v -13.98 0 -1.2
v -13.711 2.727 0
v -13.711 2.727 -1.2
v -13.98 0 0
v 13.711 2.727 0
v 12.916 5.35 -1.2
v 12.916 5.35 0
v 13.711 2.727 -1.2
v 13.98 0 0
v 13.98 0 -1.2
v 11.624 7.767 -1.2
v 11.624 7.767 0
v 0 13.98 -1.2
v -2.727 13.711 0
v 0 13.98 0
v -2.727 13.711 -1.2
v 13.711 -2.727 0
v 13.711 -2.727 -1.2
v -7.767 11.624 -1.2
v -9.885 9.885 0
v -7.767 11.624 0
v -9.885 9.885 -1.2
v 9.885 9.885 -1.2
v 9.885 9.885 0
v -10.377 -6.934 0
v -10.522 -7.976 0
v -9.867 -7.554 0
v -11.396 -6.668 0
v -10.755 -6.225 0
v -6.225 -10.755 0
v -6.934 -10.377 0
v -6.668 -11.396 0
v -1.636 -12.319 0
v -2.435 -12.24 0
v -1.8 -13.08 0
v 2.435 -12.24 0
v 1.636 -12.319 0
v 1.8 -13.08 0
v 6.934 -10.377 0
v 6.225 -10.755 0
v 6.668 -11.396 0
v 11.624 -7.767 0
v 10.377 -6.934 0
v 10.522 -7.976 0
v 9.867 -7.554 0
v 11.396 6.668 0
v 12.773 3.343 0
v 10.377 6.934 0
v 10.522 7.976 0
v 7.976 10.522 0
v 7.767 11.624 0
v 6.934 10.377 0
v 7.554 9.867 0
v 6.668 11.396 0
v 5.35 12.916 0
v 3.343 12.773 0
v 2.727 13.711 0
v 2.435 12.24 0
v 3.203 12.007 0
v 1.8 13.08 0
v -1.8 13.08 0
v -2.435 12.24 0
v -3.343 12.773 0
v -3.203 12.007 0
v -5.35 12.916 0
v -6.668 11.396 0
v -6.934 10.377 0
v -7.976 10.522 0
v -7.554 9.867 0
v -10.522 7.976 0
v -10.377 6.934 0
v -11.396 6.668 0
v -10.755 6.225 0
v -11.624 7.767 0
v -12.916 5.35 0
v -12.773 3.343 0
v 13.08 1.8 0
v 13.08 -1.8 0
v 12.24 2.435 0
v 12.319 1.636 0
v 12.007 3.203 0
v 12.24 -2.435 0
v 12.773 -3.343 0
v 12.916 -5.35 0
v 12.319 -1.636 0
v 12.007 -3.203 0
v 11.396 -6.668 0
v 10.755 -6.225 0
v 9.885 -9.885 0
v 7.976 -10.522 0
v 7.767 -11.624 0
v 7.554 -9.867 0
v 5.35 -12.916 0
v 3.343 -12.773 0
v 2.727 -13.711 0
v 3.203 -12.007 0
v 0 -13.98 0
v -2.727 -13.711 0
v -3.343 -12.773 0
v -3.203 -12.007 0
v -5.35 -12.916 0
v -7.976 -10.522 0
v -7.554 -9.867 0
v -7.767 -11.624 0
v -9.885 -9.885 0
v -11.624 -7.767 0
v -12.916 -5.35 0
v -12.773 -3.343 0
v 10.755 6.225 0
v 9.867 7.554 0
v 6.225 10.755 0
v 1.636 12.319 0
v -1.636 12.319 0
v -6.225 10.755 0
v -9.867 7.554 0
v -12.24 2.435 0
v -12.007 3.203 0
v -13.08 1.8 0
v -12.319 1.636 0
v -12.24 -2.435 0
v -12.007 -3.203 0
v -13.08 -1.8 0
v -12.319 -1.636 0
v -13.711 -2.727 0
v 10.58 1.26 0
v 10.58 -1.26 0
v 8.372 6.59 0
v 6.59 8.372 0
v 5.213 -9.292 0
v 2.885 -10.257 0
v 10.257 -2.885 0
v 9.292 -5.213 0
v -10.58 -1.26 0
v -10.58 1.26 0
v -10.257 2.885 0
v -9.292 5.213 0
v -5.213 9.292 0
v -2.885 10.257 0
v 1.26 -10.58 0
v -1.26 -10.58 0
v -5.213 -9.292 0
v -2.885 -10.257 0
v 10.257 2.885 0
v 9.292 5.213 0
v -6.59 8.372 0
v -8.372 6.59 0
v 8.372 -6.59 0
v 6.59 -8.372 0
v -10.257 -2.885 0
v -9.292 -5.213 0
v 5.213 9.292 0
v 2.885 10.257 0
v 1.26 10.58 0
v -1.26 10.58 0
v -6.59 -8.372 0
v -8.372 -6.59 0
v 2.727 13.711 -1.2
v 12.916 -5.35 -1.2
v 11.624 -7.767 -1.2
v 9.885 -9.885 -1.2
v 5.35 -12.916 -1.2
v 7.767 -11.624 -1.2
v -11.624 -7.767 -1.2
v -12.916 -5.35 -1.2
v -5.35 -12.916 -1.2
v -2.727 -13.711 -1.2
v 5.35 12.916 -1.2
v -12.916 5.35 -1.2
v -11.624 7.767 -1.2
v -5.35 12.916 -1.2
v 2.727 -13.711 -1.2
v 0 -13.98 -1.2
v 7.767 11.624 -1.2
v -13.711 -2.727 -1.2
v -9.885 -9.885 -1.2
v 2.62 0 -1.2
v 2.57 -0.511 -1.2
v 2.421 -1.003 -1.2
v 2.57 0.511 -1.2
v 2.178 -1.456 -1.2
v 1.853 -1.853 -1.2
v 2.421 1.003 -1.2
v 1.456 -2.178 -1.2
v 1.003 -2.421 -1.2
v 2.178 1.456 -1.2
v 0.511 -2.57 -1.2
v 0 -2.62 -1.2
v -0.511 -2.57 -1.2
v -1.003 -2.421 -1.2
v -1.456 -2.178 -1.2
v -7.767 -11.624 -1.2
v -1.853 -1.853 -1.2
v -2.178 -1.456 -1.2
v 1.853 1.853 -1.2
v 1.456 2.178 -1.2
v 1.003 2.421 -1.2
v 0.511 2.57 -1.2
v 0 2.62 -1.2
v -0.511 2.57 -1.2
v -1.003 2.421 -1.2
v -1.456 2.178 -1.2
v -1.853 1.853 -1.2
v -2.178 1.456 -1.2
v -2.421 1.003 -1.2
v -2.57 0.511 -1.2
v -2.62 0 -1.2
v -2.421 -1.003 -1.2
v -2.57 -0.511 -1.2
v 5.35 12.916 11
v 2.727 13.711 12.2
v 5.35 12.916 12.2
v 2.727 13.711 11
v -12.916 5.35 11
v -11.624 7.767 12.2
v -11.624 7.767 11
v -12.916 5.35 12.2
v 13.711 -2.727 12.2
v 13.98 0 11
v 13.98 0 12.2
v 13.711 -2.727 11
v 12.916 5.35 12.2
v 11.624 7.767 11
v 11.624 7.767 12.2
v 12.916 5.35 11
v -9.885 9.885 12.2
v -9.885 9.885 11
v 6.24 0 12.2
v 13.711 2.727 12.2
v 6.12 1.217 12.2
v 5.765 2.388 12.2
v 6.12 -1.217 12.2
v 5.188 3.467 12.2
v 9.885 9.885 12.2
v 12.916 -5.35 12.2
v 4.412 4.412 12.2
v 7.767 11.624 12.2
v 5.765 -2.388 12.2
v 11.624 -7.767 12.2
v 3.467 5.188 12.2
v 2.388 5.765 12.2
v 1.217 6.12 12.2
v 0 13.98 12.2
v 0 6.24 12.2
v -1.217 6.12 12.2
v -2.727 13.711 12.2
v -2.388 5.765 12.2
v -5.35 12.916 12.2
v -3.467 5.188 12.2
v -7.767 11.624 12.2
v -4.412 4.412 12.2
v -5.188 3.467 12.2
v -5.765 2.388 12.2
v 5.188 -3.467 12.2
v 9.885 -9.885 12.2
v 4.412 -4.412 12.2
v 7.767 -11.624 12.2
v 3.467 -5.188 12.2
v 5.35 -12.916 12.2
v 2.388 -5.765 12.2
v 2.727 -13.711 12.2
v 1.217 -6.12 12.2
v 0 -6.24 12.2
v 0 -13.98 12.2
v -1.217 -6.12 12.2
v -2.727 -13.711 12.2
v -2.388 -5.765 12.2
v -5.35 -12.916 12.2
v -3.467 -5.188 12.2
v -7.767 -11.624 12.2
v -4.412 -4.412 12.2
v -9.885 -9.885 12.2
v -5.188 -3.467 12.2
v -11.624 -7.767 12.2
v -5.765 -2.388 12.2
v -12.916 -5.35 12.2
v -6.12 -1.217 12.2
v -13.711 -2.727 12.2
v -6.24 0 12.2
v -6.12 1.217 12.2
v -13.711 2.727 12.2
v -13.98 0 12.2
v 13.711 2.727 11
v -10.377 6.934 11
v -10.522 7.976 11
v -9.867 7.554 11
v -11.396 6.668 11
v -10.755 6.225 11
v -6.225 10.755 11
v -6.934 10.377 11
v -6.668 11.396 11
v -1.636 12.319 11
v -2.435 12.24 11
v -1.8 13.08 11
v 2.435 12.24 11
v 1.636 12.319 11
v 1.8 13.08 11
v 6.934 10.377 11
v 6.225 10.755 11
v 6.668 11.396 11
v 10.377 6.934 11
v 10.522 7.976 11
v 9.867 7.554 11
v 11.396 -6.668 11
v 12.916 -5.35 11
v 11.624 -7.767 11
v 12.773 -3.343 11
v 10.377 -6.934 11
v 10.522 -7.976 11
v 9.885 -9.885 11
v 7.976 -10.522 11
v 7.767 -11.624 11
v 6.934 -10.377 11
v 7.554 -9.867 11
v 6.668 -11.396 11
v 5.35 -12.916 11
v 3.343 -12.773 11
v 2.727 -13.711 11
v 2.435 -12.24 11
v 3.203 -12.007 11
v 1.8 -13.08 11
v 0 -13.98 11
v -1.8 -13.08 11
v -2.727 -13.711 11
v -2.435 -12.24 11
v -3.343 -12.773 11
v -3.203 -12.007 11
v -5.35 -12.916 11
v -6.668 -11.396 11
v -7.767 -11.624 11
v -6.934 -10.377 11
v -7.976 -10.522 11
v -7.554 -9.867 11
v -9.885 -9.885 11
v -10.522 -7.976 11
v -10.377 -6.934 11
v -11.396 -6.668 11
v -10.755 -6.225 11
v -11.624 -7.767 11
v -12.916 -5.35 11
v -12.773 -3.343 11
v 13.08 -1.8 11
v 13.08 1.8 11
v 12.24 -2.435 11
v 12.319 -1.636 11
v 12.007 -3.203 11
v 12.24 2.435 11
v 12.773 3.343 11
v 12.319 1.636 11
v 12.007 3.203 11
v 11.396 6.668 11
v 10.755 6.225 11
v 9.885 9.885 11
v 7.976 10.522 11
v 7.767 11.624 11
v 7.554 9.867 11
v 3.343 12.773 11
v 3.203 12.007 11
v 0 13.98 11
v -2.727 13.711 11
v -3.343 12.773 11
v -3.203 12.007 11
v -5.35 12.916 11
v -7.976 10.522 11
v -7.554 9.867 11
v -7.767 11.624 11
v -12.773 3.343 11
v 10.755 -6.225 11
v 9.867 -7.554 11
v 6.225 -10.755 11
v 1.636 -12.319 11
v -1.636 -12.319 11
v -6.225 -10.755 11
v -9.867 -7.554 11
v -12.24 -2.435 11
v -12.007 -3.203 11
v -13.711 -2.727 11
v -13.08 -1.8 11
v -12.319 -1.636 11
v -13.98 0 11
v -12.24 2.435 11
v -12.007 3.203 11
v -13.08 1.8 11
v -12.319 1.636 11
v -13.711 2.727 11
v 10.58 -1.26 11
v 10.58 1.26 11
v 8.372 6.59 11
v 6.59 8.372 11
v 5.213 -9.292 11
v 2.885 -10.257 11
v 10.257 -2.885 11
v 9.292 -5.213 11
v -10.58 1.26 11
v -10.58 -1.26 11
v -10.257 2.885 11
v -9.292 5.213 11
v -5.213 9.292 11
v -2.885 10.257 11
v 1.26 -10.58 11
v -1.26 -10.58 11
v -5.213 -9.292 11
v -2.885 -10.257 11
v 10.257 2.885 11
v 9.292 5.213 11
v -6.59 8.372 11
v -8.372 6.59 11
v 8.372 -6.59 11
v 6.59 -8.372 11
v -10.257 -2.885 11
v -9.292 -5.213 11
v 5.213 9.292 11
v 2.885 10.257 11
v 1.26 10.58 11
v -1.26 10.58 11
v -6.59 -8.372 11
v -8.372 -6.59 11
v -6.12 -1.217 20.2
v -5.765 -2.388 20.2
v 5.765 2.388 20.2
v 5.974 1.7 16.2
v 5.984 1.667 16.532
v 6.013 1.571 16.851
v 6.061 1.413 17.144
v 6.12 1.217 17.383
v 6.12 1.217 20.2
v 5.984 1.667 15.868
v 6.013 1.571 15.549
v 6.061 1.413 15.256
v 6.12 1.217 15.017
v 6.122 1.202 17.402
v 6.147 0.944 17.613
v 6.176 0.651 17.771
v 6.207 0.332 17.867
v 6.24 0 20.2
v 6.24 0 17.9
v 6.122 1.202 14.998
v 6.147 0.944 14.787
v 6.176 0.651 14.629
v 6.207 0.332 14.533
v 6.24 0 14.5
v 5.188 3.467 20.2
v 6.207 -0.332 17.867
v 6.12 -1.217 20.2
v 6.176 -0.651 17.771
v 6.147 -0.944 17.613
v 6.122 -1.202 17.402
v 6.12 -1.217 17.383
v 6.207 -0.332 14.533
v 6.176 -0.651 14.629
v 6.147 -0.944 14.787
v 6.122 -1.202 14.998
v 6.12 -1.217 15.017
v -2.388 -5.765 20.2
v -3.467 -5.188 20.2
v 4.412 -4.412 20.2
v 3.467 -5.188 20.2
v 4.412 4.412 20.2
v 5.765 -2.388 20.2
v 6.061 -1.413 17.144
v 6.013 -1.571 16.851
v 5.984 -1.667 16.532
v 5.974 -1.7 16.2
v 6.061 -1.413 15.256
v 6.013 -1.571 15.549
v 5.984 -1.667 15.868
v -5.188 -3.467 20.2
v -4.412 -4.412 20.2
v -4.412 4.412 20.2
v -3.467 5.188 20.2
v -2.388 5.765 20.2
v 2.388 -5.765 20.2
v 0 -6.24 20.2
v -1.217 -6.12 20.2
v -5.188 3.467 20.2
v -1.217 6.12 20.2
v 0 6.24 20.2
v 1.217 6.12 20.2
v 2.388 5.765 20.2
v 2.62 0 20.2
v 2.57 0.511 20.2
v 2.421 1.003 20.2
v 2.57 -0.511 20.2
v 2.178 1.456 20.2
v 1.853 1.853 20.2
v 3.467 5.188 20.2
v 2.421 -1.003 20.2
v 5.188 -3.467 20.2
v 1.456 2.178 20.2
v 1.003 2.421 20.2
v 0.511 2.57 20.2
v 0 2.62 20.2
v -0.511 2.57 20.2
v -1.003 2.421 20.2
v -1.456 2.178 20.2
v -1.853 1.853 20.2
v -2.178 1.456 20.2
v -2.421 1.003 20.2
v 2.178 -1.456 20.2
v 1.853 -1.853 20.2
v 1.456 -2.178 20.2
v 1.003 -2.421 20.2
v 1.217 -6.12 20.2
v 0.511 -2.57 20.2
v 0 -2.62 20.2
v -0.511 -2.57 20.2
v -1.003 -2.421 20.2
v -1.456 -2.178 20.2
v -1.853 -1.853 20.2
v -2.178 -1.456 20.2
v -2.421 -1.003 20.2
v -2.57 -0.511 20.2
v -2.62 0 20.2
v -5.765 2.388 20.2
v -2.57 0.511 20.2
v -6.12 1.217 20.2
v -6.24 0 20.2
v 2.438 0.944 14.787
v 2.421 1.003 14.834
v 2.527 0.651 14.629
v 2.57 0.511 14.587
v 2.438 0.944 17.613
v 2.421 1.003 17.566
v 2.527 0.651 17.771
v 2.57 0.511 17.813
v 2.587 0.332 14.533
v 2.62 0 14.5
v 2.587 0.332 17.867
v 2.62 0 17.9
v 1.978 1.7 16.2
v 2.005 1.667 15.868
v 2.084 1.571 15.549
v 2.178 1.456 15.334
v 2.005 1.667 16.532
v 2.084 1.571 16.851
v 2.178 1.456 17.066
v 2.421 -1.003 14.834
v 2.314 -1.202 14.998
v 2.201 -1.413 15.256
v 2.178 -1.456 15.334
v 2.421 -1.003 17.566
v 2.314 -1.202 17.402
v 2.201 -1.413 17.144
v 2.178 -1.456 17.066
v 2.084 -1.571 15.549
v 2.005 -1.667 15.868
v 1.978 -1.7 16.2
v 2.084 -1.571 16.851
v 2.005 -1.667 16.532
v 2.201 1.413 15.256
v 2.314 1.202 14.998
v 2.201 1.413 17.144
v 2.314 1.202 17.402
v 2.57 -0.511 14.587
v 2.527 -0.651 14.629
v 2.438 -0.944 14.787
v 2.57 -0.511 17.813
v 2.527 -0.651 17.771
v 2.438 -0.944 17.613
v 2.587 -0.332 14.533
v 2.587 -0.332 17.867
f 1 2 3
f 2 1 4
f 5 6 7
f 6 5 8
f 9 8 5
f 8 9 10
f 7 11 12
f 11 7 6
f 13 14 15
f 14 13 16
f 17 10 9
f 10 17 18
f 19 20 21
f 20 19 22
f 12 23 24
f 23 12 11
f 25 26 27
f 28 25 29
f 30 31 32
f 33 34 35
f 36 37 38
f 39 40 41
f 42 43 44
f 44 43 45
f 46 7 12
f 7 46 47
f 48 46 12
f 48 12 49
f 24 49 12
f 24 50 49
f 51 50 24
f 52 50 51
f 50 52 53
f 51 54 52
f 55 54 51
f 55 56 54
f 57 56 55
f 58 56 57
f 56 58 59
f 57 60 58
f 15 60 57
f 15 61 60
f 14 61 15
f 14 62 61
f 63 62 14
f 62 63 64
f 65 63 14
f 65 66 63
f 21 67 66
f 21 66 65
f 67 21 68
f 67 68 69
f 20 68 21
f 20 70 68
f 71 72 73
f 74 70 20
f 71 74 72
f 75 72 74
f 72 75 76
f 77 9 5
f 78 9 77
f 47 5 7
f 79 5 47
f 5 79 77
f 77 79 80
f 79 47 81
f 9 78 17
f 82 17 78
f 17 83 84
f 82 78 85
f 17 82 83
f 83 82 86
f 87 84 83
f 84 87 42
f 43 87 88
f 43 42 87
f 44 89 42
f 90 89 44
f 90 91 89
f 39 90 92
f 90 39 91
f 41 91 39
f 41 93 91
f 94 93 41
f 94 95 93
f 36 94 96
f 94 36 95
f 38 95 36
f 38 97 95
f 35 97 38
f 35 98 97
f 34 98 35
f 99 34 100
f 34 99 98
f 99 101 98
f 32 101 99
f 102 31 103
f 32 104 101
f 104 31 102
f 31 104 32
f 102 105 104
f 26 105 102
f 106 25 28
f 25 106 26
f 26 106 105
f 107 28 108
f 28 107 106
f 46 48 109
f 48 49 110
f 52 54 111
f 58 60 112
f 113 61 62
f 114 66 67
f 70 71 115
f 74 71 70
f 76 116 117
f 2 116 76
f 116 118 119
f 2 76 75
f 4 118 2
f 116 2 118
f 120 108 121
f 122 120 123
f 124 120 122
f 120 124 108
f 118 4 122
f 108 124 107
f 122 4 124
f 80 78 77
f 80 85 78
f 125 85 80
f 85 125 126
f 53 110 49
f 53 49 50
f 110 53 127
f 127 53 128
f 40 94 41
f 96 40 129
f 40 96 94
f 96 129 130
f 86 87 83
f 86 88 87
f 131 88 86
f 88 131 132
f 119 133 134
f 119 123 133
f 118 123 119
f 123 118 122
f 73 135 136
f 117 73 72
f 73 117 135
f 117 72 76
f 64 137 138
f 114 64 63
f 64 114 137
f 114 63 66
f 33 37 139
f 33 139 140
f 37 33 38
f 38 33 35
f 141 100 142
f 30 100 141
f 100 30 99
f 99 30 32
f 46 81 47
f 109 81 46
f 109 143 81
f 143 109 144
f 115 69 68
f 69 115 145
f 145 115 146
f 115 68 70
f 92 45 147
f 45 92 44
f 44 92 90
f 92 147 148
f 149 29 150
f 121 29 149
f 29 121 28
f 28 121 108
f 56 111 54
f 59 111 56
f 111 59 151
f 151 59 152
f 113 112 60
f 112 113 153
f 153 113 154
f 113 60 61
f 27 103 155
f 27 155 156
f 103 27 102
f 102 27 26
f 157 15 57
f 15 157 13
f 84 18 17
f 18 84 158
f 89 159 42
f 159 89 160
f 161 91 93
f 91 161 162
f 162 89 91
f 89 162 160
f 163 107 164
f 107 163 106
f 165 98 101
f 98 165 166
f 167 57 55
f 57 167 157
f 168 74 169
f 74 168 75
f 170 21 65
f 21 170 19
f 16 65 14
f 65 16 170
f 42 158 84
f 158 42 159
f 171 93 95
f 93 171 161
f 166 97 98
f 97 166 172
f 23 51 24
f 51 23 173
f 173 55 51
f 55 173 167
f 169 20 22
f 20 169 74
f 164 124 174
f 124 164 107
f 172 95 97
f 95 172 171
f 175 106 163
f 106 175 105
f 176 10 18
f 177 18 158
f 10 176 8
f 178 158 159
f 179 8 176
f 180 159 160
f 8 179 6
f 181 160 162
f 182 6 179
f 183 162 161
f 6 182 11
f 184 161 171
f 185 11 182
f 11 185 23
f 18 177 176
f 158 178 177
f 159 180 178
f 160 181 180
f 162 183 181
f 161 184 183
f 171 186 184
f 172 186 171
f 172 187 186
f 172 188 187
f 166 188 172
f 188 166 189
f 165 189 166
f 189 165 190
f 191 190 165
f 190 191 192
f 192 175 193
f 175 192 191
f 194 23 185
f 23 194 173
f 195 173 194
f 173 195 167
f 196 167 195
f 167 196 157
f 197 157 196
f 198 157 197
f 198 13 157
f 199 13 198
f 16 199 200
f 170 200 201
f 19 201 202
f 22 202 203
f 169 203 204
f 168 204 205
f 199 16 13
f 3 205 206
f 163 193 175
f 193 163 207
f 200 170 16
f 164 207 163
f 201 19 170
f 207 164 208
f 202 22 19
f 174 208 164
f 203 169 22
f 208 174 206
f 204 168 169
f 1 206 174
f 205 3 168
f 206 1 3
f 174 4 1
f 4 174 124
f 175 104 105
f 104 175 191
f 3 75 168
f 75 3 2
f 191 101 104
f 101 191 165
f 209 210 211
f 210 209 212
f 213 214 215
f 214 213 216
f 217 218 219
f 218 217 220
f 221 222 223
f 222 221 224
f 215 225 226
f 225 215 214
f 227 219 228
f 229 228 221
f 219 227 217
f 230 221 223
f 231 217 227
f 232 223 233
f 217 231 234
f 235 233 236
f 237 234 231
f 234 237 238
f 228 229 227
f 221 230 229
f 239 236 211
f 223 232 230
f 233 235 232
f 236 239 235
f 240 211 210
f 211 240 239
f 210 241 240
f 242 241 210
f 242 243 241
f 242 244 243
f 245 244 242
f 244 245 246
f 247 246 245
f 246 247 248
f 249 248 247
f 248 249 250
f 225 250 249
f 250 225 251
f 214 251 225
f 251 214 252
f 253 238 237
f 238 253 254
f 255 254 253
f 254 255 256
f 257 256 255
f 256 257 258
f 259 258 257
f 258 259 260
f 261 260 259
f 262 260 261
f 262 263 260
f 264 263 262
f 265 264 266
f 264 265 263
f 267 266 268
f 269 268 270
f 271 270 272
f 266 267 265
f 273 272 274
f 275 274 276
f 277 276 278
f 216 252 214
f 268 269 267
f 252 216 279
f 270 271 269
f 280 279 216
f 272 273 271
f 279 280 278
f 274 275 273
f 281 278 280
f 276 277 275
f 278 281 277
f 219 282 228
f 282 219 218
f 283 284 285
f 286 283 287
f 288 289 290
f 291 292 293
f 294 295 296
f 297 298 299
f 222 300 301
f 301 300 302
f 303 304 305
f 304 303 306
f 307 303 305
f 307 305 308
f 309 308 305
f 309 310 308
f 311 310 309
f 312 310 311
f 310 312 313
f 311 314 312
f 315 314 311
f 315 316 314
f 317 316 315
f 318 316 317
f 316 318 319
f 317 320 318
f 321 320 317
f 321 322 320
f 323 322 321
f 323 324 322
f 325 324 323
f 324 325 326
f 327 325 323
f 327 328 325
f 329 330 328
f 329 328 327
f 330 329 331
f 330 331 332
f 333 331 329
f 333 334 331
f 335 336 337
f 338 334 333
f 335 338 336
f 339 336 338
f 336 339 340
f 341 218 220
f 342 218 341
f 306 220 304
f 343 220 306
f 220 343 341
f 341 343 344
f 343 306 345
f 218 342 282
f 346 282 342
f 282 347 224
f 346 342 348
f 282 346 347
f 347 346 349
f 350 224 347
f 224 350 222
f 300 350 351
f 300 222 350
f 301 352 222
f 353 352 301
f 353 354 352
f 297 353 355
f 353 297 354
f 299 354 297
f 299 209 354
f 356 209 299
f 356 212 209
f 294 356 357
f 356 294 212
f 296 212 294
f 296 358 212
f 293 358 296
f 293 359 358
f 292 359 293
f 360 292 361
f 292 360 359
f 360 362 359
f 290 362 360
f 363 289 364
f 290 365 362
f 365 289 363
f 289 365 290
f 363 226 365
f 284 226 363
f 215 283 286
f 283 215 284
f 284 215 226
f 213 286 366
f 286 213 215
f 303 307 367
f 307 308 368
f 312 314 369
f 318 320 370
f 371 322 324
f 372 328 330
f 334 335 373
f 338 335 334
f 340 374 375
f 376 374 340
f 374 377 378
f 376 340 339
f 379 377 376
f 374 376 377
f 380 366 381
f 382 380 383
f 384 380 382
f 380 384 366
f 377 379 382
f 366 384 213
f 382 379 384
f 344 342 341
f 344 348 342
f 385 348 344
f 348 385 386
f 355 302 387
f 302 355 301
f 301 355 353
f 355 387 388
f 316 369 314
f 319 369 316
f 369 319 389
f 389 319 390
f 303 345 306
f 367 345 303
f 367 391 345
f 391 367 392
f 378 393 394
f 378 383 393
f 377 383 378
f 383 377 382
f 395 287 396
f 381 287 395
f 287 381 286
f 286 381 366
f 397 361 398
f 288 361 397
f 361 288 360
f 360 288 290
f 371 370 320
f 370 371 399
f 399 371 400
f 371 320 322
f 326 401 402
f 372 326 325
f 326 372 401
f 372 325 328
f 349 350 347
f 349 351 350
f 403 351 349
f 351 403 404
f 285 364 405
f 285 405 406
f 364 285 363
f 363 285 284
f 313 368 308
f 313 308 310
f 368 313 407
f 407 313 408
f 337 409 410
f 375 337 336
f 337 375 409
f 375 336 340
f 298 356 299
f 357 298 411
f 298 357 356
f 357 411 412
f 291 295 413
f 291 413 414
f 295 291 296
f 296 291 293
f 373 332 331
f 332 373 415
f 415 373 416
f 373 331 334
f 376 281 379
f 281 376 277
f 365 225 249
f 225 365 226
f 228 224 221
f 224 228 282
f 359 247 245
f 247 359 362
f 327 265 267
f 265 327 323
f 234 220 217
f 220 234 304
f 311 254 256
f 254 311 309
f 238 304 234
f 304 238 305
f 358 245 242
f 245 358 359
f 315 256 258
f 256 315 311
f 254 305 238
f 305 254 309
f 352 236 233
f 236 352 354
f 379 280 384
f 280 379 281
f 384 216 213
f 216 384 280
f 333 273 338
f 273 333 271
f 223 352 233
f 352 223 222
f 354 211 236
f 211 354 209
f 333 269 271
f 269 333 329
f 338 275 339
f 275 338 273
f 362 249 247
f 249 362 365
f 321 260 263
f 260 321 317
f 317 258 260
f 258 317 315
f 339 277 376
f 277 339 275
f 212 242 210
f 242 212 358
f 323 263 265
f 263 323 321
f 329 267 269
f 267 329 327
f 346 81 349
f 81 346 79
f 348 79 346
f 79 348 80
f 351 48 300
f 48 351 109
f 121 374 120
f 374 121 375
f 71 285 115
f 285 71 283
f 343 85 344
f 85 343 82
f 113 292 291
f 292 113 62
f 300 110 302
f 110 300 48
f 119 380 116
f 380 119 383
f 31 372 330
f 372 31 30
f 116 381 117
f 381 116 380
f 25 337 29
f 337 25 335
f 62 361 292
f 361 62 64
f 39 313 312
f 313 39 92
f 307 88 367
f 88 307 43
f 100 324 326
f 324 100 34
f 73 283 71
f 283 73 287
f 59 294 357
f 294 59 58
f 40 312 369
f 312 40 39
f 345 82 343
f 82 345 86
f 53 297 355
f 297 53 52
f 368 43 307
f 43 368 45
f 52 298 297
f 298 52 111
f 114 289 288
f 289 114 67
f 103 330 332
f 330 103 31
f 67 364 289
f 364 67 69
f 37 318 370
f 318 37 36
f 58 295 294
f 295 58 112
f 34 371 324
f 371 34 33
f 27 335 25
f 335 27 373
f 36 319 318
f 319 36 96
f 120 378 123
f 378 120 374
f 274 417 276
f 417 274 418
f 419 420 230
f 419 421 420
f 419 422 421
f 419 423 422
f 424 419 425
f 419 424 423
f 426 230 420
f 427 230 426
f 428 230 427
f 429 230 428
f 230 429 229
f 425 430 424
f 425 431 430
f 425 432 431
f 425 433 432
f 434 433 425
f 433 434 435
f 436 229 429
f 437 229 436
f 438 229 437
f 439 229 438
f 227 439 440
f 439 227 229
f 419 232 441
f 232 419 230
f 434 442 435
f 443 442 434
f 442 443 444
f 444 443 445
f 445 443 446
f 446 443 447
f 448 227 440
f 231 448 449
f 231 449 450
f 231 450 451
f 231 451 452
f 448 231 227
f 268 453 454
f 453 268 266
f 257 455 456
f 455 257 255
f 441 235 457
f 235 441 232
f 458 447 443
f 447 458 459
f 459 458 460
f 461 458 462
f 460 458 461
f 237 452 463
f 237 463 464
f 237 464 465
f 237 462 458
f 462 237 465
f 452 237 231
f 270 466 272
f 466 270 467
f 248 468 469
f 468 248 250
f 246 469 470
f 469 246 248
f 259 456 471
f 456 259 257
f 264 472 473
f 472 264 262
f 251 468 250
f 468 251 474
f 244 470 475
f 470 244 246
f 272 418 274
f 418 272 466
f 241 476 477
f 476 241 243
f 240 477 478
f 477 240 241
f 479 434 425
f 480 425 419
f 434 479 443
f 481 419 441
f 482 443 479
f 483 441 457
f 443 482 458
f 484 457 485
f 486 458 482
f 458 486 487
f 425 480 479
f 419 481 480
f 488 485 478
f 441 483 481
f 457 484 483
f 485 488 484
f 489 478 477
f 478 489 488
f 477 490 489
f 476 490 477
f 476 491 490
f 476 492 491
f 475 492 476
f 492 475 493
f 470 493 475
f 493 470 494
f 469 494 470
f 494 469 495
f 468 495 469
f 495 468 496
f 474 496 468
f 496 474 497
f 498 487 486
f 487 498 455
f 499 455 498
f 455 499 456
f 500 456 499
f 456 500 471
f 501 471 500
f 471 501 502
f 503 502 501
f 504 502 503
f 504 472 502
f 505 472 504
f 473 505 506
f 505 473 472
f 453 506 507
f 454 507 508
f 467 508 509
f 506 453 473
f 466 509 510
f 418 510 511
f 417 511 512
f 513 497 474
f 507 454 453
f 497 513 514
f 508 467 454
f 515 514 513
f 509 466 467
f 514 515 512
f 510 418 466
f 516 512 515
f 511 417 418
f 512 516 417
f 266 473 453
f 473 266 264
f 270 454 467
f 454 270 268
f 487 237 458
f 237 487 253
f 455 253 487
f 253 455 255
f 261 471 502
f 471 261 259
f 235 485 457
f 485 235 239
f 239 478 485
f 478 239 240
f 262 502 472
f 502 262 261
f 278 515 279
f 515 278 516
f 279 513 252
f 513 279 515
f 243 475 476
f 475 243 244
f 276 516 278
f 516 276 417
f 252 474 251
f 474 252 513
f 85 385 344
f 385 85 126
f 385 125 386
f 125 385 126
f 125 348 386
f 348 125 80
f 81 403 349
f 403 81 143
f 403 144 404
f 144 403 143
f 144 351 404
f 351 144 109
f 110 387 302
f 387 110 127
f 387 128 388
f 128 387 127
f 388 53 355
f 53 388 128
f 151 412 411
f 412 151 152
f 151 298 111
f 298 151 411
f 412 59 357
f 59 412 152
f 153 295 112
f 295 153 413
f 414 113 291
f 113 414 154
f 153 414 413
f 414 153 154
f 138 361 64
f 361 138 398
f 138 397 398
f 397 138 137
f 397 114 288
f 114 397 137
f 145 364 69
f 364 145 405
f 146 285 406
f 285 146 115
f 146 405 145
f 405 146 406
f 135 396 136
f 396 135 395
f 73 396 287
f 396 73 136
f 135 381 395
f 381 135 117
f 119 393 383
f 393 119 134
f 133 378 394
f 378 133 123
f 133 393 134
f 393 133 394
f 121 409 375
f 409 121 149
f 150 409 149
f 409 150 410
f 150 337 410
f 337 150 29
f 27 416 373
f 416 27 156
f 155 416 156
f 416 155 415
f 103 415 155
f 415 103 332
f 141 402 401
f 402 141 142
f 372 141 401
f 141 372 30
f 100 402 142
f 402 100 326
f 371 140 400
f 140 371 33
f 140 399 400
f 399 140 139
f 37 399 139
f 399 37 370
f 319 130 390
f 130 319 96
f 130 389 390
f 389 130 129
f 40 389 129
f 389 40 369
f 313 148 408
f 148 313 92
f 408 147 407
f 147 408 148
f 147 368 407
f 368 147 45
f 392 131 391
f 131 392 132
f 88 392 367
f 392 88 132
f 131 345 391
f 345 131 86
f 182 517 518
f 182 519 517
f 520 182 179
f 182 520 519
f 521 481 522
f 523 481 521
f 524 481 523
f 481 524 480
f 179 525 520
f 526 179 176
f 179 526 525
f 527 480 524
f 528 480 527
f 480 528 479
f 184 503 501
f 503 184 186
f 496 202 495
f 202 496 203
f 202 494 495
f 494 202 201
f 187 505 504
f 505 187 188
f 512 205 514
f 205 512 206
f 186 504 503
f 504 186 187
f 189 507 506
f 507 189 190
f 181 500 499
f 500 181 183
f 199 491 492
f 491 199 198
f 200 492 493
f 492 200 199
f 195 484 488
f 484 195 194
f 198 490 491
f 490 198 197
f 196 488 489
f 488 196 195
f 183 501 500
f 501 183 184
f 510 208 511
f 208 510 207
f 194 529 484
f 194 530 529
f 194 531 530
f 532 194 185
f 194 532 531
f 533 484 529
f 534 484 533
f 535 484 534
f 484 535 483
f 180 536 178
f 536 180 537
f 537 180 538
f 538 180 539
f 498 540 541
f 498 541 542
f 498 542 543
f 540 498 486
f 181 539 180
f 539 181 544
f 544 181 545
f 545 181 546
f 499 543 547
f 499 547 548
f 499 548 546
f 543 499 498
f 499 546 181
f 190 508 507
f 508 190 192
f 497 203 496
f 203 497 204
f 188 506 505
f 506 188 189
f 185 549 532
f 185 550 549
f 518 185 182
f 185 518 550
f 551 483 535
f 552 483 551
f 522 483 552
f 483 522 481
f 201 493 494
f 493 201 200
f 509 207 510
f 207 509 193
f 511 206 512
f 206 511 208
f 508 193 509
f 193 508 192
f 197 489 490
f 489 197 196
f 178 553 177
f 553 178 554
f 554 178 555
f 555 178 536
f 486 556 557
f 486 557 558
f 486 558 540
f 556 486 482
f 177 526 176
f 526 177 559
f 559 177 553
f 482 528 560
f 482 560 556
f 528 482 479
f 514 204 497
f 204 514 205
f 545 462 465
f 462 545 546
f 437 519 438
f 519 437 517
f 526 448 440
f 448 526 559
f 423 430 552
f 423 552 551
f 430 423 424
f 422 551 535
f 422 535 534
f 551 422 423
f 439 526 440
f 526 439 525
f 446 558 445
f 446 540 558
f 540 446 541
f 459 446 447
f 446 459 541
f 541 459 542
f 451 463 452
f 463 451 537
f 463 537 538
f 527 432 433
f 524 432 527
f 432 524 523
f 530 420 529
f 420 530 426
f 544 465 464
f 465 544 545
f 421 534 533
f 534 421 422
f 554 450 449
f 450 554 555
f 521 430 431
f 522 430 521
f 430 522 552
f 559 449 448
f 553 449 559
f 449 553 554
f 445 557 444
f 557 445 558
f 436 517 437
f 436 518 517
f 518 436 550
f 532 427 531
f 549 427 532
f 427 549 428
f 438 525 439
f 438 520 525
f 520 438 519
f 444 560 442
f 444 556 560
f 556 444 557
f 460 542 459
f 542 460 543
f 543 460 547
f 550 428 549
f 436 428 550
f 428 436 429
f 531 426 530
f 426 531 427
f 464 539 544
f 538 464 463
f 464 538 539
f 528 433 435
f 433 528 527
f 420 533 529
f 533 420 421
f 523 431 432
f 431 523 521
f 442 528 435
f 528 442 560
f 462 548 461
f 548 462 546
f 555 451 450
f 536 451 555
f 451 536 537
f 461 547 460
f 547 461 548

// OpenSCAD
$fn = 32;

// ----------------------------------------------------------------------
// Timing pulley: T5 16T, pitch 5 mm, 27.96 mm x 21.4 mm
// ----------------------------------------------------------------------

// --- parameters (mm) ---
pitch = 5;                // belt pitch
teeth = 16;               // number of grooves
belt_w = 11;              // belt width between the flanges
tip_d = 24.96;            // tip circle diameter
root_d = 22.36;           // groove bottom diameter
groove_h = 1.3;           // groove depth
tooth_w = 3;              // groove width at the tip circle
flange_d = 27.96;         // flange diameter
flange_t = 1.2;           // flange thickness
spigot_d = 20.76;         // flange spigot, sunk into the rim
spigot_h = 1.2;           // spigot depth into the rim
bore_d = 5.24;            // shaft bore
hub_d = 12.48;            // hub diameter
hub_h = 8;                // hub above the flange
bottom_z = -1.2;          // lowest point of the pulley
top_z = 20.2;             // highest point of the pulley
set_d = 3.4;              // set screw tap hole

module rim() {
  cylinder(h = belt_w, d = tip_d);
}

module groove_cutter() {
  /* belt tooth groove: deeper than wide, cut through the belt width */
  translate([root_d / 2, 0, 0])
    linear_extrude(height = belt_w)
      polygon(points = [[-0.6, -tooth_w * 0.42], [groove_h + 0.6, -tooth_w * 0.6],
                        [groove_h + 0.6, tooth_w * 0.6], [-0.6, tooth_w * 0.42]]);
}

module flanges() {
  translate([0, 0, -flange_t]) cylinder(h = flange_t, d = flange_d);
  translate([0, 0, belt_w]) cylinder(h = flange_t, d = flange_d);
  translate([0, 0, -spigot_h]) cylinder(h = spigot_h + 0.6, d = spigot_d);
  translate([0, 0, belt_w - 0.6]) cylinder(h = spigot_h + 0.6, d = spigot_d);
}

module hub() {
  translate([0, 0, bottom_z]) cylinder(h = top_z - bottom_z, d = hub_d);
}

difference() {
  union() {
    rim();
    hub();
    flanges();
  }
  for (i = [0 : teeth - 1]) rotate([0, 0, i * 360 / teeth]) groove_cutter();
  translate([0, 0, bottom_z - 1]) cylinder(h = top_z - bottom_z + 2, d = bore_d);
  translate([-1, 0, top_z - hub_h * 0.5]) rotate([0, 90, 0]) cylinder(h = hub_d / 2 + 3, d = set_d);
}
